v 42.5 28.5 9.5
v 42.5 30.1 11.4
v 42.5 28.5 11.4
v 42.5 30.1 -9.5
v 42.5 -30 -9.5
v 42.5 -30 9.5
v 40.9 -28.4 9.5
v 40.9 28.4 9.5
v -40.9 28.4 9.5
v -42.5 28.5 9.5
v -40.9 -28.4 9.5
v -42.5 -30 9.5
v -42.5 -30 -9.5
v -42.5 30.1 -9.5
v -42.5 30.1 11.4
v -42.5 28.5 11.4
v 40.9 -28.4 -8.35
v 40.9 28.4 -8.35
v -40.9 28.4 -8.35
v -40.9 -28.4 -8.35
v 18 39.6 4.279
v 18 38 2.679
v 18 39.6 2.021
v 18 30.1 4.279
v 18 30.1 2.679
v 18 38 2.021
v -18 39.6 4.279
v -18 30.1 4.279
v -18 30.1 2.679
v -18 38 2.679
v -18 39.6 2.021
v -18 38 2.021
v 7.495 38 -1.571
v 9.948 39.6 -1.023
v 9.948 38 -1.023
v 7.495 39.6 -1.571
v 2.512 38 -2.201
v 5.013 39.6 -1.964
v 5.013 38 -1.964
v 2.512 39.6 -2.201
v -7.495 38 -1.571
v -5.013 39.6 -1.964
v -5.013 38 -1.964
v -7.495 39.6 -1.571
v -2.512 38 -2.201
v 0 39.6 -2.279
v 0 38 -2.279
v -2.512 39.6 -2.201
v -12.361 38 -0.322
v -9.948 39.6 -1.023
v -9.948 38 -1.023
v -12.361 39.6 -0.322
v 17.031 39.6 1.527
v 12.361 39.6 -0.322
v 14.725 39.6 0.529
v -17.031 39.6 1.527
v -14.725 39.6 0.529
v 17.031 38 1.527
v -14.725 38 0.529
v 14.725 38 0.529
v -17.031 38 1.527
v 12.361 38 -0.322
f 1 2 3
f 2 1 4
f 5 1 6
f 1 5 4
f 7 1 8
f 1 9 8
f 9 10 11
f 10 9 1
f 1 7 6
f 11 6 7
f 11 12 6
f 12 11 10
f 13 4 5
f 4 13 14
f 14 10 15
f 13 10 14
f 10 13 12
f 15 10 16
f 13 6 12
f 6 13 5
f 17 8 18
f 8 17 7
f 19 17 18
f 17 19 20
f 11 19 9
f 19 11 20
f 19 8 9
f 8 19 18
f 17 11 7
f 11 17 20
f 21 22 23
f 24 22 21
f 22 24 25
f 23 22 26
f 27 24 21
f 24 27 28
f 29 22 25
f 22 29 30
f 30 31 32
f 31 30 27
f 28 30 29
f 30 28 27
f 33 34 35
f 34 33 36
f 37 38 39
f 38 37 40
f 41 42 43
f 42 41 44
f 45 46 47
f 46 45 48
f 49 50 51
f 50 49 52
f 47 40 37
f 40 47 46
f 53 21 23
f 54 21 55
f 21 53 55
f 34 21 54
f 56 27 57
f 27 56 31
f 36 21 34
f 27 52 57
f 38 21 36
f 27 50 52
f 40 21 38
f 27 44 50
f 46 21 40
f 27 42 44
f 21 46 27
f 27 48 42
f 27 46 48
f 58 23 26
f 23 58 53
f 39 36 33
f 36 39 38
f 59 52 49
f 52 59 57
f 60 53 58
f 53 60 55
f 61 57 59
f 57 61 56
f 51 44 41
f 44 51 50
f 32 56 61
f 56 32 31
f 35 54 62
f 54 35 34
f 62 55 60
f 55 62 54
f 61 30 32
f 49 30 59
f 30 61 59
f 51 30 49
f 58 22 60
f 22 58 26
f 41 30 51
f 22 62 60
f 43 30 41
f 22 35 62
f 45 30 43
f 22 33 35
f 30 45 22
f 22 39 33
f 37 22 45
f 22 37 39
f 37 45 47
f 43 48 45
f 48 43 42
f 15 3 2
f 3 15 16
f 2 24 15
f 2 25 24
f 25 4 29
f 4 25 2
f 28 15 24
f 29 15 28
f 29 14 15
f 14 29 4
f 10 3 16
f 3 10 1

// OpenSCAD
/* [Global settings] */
// Generates shelf if true, drawer if false
shelf = false;

/* [Shelf settings] */
// Thickness of shelf walls
wall_thickness = 1.6;

// Whether the shelf should have a solid back
back_wall = false;

// Whether the material between the shelves should be removed
cut_middle_y = true;

// The width of the shelf rail if the middle is cut out
drawer_rail_size = 5;

// Number of drawers the shelf should hold horizontally
drawer_count_x = 1;

// Number of drawers the shelf should hold vertically
drawer_count_y = 2;

// Space to leave between the shelf and drawers
drawer_gap = 0.3;

/* [Drawer settings] */
// Thickness of drawer walls
drawer_wall_thickness = 1.6;

// Width of the drawer
drawer_width = 85;

// Height of the drawer
drawer_height = 19;

// Depth of the drawer
drawer_depth = 60;

/* [Drawer handle settings] */
// Depth
drawer_handle_depth = 8;

// Width
drawer_handle_width = 40;

// Height
drawer_handle_height = 8;

/* [Connectors] */
// Whether to generate connectors to link multiple shelves
use_connectors = true;

// Generate connector at top
connector_top = true;

// Generate connector to right
connector_right = true;

// Generate connector at bottom
connector_bottom = false;

// Generate connector at left
connector_left = false;

// Whether the last connector should have a square edge
square_edge_connectors = true;

// Thickness of connector
connector_thickness = 1.5;

// Width of narrow edge of connector
connector_narrow = 2;

// Width of broad edge of connector
connector_broad = 3;

// Number of connectors at each corner
connector_count = 3;

// Affects how round the connector's edges are
connector_radius = 0.3;

// Spacing between connectors to allow them to slide between each other
connector_clearance = 0.65; // [0.05:0.01:3]

/* [Test Connectors] */

// Generate a connector test
test_connectors = false;

// Number of connectors to generate to the positive side
test_connector_positive_count = 5; // [0:100]

// Number of connectors to generate to the negative side
test_connector_negative_count = 5; // [0:100]

// Height of connectors
test_connector_height = 5; // [2:20]

// Font size of connector label
test_font_size = 1.5; // [1:.1:10]

// Percentage to add or subtract from connector_clearance
test_amount = 0.05; // [0.00:.01:.5]

/* [Hidden] */
epsilon = 0.1;

module connector_trapezoid(h=10, center=false, sl=false, sr=false) {
    translate([center ? 0 : connector_thickness / 2,
               center ? 0 : connector_broad / 2,
               0])
    hull() {
        translate([-connector_thickness/2+connector_radius,-connector_narrow/2+connector_radius,0])
            cylinder(r=connector_radius, h=h, center=center);
        translate([-connector_thickness/2+connector_radius,connector_narrow/2-connector_radius,0])
            cylinder(r=connector_radius, h=h, center=center);
        translate([connector_thickness/2-connector_radius,-connector_broad/2+connector_radius,0])
            cylinder(r=connector_radius, h=h, center=center);
        translate([connector_thickness/2-connector_radius,connector_broad/2-connector_radius,0])
            cylinder(r=connector_radius, h=h, center=center);
        if (sr) {
            translate([-connector_thickness/2,connector_broad/2-epsilon,0])
                cube([epsilon,epsilon,h]);
        }
        if (sl) {
            translate([-connector_thickness/2,-connector_broad/2,0])
                cube([epsilon,epsilon,h]);
        }
    }
    
    connector_angle = atan(((connector_broad - connector_narrow) / 2) / (connector_thickness - connector_radius*2));
    rotated_angle = 90 + connector_angle;
    x_intercept = sin(connector_angle) * connector_radius;
    y_intercept = sin(180 - rotated_angle) * connector_radius;
    x_offset = connector_radius - sin(connector_angle) * connector_radius;
    y_offset = connector_radius - cos(connector_angle) * connector_radius;
    x_correction = x_intercept + connector_radius - x_offset;
    y_correction = x_correction * tan(connector_angle);
    
    translate([center ? -connector_thickness/2 : 0,
               center ? -connector_broad/2 : 0,
               center ? -h/2 : 0])
    intersection() {
        union () {
            translate([-x_intercept + x_offset + x_correction,
                       -y_intercept + y_offset + (connector_broad - connector_narrow)/2 - y_correction,
                       0])
            rotate([0,0,90-connector_angle])
                rotate_extrude(angle=rotated_angle)
                    translate([connector_radius,0,0])
                        square([wall_thickness, h]);
            
            translate([-x_intercept + x_offset + x_correction,
                       y_intercept - y_offset + y_correction + connector_broad - (connector_broad - connector_narrow)/2,
                       h])
            rotate([180,0,270+connector_angle])
                rotate_extrude(angle=rotated_angle)
                    translate([connector_radius,0,0])
                        square([wall_thickness, h]);
        }
        translate([0,0,0])
            cube([connector_thickness, connector_broad, h]);
    }
}

module connector_group(l=10, sr=false, sl=false) {
    for (i=[0:connector_count-1]) {
        translate([0,
                   (i*(connector_narrow + connector_broad + connector_clearance*2)),
                   0])
            connector_trapezoid(h=l, sr=(sr && i==connector_count-1), sl=(sl && i==0));
    }
}

module shelf_connectors() {
    spacing = wall_thickness + drawer_gap*2;
    temp_top = wall_thickness + (spacing + drawer_height)*drawer_count_y - drawer_height/2;
    temp_left = wall_thickness + (spacing + drawer_width)*drawer_count_x - drawer_width/2;
    temp_right = - drawer_width/2;
    temp_bottom = - drawer_height/2;
    temp_connector_width = (connector_broad + connector_narrow)/2 + connector_clearance;
    if (use_connectors) {
        if (connector_top) {
            translate([temp_right + temp_connector_width,
                       -(back_wall ? wall_thickness : 0)-drawer_depth / 2-drawer_gap,
                       temp_top])
            rotate([90,270,180])
                connector_group(drawer_depth + drawer_gap - (drawer_wall_thickness + drawer_gap) + (back_wall ? wall_thickness : 0));
            
            translate([temp_left,
                       drawer_depth / 2 - drawer_wall_thickness-drawer_gap,
                       temp_top])
            rotate([90,270,0])
                connector_group(drawer_depth + drawer_gap - (drawer_wall_thickness + drawer_gap) + (back_wall ? wall_thickness : 0), sl=square_edge_connectors);
        }

        if (connector_left) {
            translate([temp_left,
                       -(back_wall ? wall_thickness : 0)-drawer_depth / 2 - drawer_gap,
                       temp_top - temp_connector_width])
            rotate([90,180,180])
                connector_group(drawer_depth + drawer_gap + (back_wall ? wall_thickness : 0));
            
            translate([temp_left,
                       drawer_depth / 2,
                       temp_bottom])
            rotate([270,180,180])
                connector_group(drawer_depth + drawer_gap + (back_wall ? wall_thickness : 0), sl=square_edge_connectors);
        }

        if (connector_bottom) {
            translate([temp_left - temp_connector_width,
                       -(back_wall ? wall_thickness : 0)-drawer_depth / 2 - drawer_gap,
                       temp_bottom])
            rotate([90,90,180])
                connector_group(drawer_depth + drawer_gap + (back_wall ? wall_thickness : 0));
            
            translate([temp_right,
                       drawer_depth / 2,
                       temp_bottom])
            rotate([90,90,0])
                connector_group(drawer_depth + drawer_gap + (back_wall ? wall_thickness : 0), sl=square_edge_connectors);
        }

        if (connector_right) {
            translate([temp_right,
                       -(back_wall ? wall_thickness : 0)-drawer_depth / 2 - drawer_gap,
                       temp_bottom + temp_connector_width])
            rotate([270,180,0])
                connector_group(drawer_depth + drawer_gap + (back_wall ? wall_thickness : 0));
            
            translate([temp_right,
                       drawer_depth / 2,
                       temp_top])
            rotate([90,180,0])
                connector_group(drawer_depth + drawer_gap + (back_wall ? wall_thickness : 0), sl=square_edge_connectors);
        }
    }
}

module connector_test(h=10, test_count_positive=4, test_count_negative=4) {
    distance = test_amount * connector_clearance;
    font_size = test_font_size;
    test_count = test_count_positive + test_count_negative + 1;
    for (i=[-test_count_negative:test_count_positive]) {
        temp_spacing = distance * i;
        prev_position = i * (connector_narrow + connector_broad + (temp_spacing + connector_clearance*2));
        temp_separation = prev_position + (connector_clearance+temp_spacing)*2;
        translate([0,temp_separation,0]) connector_trapezoid(h=h, center=true);

        if (i < test_count_positive && $preview)
           %translate([0,
                       temp_separation + (connector_broad+connector_narrow+(distance*(i+1)+connector_clearance)*2)/2,
                        0])
            rotate([0,0,180])
                connector_trapezoid(h=h, center=true);
        translate([-connector_thickness/2 - (wall_thickness+2)/2,temp_separation,h/2])
            linear_extrude(height=.5)
                rotate([0,0,-90])
                    text(str(round((temp_spacing + connector_clearance)*100)/100),
                         font_size,
                         halign="center",
                         valign="center");
    }
    positive_width = test_count_positive * (connector_narrow + connector_broad + (distance * test_count_positive + connector_clearance*2)) + (connector_clearance + distance * test_count_positive)*2;
    negative_width = test_count_negative * (connector_narrow + connector_broad + (-distance * test_count_negative + connector_clearance*2)) + (connector_clearance + distance * test_count_negative)*2;
    middle_width = connector_broad;
    temp_width = negative_width + positive_width + middle_width;
    translate([-connector_thickness/2 - (wall_thickness + 2)/2,-temp_width/2+positive_width+middle_width/2,0])
        cube([(wall_thickness+2),temp_width,h], center=true);
    
    translate([connector_thickness + 5,0,0]) rotate([0,0,180]) connector_trapezoid(h=h,center=true);
    temp_top = 1.5*connector_thickness + 5;
    temp_x = connector_broad/2;
    tool_depth = 25;
    tool_angle = 6;
    temp_bottom = temp_top + tool_depth;
    temp_x_wide = temp_x + sin(tool_angle) * tool_depth;
    hull() {
        translate([temp_top + .5,-temp_x + .5,0]) cylinder(h=h, r=.5, center=true);
        translate([temp_top + .5,temp_x - .5,0]) cylinder(h=h, r=.5, center=true);
        translate([temp_bottom - .5,-temp_x_wide + .5,0]) cylinder(h=h, r=.5, center=true);
        translate([temp_bottom - .5,temp_x_wide - .5,0]) cylinder(h=h, r=.5, center=true);
    }
}

module drawer_handle() {
    temp_handle_height = drawer_wall_thickness + (drawer_handle_width - (cos(asin(1/2)) * drawer_handle_width));

    intersection() {
        translate([0,drawer_wall_thickness/2,-temp_handle_height/2 + drawer_wall_thickness/2])
            cube([drawer_handle_width - 4, drawer_handle_depth+drawer_wall_thickness, temp_handle_height], center=true);

        union() {
            cube([drawer_handle_width - 4, drawer_handle_depth, drawer_wall_thickness], center=true);

            translate([0,drawer_wall_thickness + drawer_handle_depth / 2,(cos(asin(1/2)) * drawer_handle_width) - drawer_wall_thickness/4])
            rotate([90,0,0])
                cylinder(r=drawer_handle_width, h=drawer_wall_thickness);
        }
    }
}

module drawer() {
    temp_handle_height = drawer_wall_thickness + (drawer_handle_width - (cos(asin(1/2)) * drawer_handle_width));

    difference() {
        cube([drawer_width, drawer_depth, drawer_height], center=true);
        translate([0, 0, drawer_wall_thickness/2])
            cube([drawer_width-2*drawer_wall_thickness, drawer_depth-2*drawer_wall_thickness, drawer_height - drawer_wall_thickness/2 + epsilon], center=true);
    }

    translate([0,drawer_depth/2 - drawer_wall_thickness/2+epsilon,(drawer_gap + wall_thickness)/2])
        cube([drawer_width,drawer_wall_thickness,drawer_height + drawer_gap + wall_thickness], center=true);
    translate([0,
               drawer_depth / 2 + drawer_handle_depth / 2,
               temp_handle_height/2])
        drawer_handle();
}

module drawers() {
    spacing = wall_thickness + drawer_gap*2;
    for(i=[0:drawer_count_x-1]) {
		for(j=[0:drawer_count_y-1]) {
            translate([spacing - drawer_gap + ((drawer_width + spacing) * i),
                       0,
                       spacing -drawer_gap + ((drawer_height + spacing) * j)])
                drawer();
        }
    }
}

module shelf() {
    spacing = wall_thickness + drawer_gap*2;
    for(i=[0:drawer_count_x]) {
        translate([-drawer_width/2 + (i*(drawer_width + spacing)),
                   -drawer_depth/2 - drawer_gap,
                   -drawer_height/2])
            cube([wall_thickness,
                  drawer_depth + drawer_gap,
                  wall_thickness + (spacing + drawer_height)*drawer_count_y]);
    }
    difference() {
        union() {
            for(j=[0:drawer_count_y]) {
                translate([-drawer_width/2,
                           -drawer_depth/2 - drawer_gap,
                           -drawer_height/2 + (j*(drawer_height + spacing))])
                    cube([wall_thickness + (spacing + drawer_width)*drawer_count_x,
                          drawer_depth + drawer_gap - (j==0 ? 0 : drawer_wall_thickness + drawer_gap),
                          wall_thickness]);
            }
        }
        if(cut_middle_y) {
            for(i=[0:drawer_count_x-1]) {
                translate([-drawer_width/2 + wall_thickness + drawer_gap + drawer_rail_size + (i*(drawer_width + spacing)),
                   -drawer_depth/2 - spacing - epsilon,
                   -drawer_height/2 + spacing - drawer_gap])
                cube([drawer_width - 2*drawer_rail_size,
                      drawer_depth + spacing + 2*epsilon,
                      -spacing + (spacing + drawer_height)*drawer_count_y]);
            }
        }
    }
    
    if (back_wall) {
        translate([-drawer_width/2,
                   -drawer_depth/2 - spacing + drawer_gap,
                   -drawer_height/2])
            cube([wall_thickness + (spacing + drawer_width)*drawer_count_x,
                  wall_thickness,
                  wall_thickness + (spacing + drawer_height)*drawer_count_y]);
    }
    
    shelf_connectors();
}

module drawer_set() {
    translate([0,10+drawer_wall_thickness,0]) drawers();
    shelf();
}

$fn=100;
if (!$preview) {
    if (test_connectors) {
        connector_test(h=test_connector_height, test_count_positive=test_connector_positive_count, test_count_negative=test_connector_negative_count);
    } else if (shelf) {
        rotate([90,0,0]) shelf();
    } else {
        rotate([0,0,0]) drawer();
    }
}
if ($preview) {
    if (test_connectors) {
        connector_test(h=test_connector_height, test_count_positive=test_connector_positive_count, test_count_negative=test_connector_negative_count);
    } else if (shelf) {
        shelf();
    } else {
        drawer_set();
    }
}
